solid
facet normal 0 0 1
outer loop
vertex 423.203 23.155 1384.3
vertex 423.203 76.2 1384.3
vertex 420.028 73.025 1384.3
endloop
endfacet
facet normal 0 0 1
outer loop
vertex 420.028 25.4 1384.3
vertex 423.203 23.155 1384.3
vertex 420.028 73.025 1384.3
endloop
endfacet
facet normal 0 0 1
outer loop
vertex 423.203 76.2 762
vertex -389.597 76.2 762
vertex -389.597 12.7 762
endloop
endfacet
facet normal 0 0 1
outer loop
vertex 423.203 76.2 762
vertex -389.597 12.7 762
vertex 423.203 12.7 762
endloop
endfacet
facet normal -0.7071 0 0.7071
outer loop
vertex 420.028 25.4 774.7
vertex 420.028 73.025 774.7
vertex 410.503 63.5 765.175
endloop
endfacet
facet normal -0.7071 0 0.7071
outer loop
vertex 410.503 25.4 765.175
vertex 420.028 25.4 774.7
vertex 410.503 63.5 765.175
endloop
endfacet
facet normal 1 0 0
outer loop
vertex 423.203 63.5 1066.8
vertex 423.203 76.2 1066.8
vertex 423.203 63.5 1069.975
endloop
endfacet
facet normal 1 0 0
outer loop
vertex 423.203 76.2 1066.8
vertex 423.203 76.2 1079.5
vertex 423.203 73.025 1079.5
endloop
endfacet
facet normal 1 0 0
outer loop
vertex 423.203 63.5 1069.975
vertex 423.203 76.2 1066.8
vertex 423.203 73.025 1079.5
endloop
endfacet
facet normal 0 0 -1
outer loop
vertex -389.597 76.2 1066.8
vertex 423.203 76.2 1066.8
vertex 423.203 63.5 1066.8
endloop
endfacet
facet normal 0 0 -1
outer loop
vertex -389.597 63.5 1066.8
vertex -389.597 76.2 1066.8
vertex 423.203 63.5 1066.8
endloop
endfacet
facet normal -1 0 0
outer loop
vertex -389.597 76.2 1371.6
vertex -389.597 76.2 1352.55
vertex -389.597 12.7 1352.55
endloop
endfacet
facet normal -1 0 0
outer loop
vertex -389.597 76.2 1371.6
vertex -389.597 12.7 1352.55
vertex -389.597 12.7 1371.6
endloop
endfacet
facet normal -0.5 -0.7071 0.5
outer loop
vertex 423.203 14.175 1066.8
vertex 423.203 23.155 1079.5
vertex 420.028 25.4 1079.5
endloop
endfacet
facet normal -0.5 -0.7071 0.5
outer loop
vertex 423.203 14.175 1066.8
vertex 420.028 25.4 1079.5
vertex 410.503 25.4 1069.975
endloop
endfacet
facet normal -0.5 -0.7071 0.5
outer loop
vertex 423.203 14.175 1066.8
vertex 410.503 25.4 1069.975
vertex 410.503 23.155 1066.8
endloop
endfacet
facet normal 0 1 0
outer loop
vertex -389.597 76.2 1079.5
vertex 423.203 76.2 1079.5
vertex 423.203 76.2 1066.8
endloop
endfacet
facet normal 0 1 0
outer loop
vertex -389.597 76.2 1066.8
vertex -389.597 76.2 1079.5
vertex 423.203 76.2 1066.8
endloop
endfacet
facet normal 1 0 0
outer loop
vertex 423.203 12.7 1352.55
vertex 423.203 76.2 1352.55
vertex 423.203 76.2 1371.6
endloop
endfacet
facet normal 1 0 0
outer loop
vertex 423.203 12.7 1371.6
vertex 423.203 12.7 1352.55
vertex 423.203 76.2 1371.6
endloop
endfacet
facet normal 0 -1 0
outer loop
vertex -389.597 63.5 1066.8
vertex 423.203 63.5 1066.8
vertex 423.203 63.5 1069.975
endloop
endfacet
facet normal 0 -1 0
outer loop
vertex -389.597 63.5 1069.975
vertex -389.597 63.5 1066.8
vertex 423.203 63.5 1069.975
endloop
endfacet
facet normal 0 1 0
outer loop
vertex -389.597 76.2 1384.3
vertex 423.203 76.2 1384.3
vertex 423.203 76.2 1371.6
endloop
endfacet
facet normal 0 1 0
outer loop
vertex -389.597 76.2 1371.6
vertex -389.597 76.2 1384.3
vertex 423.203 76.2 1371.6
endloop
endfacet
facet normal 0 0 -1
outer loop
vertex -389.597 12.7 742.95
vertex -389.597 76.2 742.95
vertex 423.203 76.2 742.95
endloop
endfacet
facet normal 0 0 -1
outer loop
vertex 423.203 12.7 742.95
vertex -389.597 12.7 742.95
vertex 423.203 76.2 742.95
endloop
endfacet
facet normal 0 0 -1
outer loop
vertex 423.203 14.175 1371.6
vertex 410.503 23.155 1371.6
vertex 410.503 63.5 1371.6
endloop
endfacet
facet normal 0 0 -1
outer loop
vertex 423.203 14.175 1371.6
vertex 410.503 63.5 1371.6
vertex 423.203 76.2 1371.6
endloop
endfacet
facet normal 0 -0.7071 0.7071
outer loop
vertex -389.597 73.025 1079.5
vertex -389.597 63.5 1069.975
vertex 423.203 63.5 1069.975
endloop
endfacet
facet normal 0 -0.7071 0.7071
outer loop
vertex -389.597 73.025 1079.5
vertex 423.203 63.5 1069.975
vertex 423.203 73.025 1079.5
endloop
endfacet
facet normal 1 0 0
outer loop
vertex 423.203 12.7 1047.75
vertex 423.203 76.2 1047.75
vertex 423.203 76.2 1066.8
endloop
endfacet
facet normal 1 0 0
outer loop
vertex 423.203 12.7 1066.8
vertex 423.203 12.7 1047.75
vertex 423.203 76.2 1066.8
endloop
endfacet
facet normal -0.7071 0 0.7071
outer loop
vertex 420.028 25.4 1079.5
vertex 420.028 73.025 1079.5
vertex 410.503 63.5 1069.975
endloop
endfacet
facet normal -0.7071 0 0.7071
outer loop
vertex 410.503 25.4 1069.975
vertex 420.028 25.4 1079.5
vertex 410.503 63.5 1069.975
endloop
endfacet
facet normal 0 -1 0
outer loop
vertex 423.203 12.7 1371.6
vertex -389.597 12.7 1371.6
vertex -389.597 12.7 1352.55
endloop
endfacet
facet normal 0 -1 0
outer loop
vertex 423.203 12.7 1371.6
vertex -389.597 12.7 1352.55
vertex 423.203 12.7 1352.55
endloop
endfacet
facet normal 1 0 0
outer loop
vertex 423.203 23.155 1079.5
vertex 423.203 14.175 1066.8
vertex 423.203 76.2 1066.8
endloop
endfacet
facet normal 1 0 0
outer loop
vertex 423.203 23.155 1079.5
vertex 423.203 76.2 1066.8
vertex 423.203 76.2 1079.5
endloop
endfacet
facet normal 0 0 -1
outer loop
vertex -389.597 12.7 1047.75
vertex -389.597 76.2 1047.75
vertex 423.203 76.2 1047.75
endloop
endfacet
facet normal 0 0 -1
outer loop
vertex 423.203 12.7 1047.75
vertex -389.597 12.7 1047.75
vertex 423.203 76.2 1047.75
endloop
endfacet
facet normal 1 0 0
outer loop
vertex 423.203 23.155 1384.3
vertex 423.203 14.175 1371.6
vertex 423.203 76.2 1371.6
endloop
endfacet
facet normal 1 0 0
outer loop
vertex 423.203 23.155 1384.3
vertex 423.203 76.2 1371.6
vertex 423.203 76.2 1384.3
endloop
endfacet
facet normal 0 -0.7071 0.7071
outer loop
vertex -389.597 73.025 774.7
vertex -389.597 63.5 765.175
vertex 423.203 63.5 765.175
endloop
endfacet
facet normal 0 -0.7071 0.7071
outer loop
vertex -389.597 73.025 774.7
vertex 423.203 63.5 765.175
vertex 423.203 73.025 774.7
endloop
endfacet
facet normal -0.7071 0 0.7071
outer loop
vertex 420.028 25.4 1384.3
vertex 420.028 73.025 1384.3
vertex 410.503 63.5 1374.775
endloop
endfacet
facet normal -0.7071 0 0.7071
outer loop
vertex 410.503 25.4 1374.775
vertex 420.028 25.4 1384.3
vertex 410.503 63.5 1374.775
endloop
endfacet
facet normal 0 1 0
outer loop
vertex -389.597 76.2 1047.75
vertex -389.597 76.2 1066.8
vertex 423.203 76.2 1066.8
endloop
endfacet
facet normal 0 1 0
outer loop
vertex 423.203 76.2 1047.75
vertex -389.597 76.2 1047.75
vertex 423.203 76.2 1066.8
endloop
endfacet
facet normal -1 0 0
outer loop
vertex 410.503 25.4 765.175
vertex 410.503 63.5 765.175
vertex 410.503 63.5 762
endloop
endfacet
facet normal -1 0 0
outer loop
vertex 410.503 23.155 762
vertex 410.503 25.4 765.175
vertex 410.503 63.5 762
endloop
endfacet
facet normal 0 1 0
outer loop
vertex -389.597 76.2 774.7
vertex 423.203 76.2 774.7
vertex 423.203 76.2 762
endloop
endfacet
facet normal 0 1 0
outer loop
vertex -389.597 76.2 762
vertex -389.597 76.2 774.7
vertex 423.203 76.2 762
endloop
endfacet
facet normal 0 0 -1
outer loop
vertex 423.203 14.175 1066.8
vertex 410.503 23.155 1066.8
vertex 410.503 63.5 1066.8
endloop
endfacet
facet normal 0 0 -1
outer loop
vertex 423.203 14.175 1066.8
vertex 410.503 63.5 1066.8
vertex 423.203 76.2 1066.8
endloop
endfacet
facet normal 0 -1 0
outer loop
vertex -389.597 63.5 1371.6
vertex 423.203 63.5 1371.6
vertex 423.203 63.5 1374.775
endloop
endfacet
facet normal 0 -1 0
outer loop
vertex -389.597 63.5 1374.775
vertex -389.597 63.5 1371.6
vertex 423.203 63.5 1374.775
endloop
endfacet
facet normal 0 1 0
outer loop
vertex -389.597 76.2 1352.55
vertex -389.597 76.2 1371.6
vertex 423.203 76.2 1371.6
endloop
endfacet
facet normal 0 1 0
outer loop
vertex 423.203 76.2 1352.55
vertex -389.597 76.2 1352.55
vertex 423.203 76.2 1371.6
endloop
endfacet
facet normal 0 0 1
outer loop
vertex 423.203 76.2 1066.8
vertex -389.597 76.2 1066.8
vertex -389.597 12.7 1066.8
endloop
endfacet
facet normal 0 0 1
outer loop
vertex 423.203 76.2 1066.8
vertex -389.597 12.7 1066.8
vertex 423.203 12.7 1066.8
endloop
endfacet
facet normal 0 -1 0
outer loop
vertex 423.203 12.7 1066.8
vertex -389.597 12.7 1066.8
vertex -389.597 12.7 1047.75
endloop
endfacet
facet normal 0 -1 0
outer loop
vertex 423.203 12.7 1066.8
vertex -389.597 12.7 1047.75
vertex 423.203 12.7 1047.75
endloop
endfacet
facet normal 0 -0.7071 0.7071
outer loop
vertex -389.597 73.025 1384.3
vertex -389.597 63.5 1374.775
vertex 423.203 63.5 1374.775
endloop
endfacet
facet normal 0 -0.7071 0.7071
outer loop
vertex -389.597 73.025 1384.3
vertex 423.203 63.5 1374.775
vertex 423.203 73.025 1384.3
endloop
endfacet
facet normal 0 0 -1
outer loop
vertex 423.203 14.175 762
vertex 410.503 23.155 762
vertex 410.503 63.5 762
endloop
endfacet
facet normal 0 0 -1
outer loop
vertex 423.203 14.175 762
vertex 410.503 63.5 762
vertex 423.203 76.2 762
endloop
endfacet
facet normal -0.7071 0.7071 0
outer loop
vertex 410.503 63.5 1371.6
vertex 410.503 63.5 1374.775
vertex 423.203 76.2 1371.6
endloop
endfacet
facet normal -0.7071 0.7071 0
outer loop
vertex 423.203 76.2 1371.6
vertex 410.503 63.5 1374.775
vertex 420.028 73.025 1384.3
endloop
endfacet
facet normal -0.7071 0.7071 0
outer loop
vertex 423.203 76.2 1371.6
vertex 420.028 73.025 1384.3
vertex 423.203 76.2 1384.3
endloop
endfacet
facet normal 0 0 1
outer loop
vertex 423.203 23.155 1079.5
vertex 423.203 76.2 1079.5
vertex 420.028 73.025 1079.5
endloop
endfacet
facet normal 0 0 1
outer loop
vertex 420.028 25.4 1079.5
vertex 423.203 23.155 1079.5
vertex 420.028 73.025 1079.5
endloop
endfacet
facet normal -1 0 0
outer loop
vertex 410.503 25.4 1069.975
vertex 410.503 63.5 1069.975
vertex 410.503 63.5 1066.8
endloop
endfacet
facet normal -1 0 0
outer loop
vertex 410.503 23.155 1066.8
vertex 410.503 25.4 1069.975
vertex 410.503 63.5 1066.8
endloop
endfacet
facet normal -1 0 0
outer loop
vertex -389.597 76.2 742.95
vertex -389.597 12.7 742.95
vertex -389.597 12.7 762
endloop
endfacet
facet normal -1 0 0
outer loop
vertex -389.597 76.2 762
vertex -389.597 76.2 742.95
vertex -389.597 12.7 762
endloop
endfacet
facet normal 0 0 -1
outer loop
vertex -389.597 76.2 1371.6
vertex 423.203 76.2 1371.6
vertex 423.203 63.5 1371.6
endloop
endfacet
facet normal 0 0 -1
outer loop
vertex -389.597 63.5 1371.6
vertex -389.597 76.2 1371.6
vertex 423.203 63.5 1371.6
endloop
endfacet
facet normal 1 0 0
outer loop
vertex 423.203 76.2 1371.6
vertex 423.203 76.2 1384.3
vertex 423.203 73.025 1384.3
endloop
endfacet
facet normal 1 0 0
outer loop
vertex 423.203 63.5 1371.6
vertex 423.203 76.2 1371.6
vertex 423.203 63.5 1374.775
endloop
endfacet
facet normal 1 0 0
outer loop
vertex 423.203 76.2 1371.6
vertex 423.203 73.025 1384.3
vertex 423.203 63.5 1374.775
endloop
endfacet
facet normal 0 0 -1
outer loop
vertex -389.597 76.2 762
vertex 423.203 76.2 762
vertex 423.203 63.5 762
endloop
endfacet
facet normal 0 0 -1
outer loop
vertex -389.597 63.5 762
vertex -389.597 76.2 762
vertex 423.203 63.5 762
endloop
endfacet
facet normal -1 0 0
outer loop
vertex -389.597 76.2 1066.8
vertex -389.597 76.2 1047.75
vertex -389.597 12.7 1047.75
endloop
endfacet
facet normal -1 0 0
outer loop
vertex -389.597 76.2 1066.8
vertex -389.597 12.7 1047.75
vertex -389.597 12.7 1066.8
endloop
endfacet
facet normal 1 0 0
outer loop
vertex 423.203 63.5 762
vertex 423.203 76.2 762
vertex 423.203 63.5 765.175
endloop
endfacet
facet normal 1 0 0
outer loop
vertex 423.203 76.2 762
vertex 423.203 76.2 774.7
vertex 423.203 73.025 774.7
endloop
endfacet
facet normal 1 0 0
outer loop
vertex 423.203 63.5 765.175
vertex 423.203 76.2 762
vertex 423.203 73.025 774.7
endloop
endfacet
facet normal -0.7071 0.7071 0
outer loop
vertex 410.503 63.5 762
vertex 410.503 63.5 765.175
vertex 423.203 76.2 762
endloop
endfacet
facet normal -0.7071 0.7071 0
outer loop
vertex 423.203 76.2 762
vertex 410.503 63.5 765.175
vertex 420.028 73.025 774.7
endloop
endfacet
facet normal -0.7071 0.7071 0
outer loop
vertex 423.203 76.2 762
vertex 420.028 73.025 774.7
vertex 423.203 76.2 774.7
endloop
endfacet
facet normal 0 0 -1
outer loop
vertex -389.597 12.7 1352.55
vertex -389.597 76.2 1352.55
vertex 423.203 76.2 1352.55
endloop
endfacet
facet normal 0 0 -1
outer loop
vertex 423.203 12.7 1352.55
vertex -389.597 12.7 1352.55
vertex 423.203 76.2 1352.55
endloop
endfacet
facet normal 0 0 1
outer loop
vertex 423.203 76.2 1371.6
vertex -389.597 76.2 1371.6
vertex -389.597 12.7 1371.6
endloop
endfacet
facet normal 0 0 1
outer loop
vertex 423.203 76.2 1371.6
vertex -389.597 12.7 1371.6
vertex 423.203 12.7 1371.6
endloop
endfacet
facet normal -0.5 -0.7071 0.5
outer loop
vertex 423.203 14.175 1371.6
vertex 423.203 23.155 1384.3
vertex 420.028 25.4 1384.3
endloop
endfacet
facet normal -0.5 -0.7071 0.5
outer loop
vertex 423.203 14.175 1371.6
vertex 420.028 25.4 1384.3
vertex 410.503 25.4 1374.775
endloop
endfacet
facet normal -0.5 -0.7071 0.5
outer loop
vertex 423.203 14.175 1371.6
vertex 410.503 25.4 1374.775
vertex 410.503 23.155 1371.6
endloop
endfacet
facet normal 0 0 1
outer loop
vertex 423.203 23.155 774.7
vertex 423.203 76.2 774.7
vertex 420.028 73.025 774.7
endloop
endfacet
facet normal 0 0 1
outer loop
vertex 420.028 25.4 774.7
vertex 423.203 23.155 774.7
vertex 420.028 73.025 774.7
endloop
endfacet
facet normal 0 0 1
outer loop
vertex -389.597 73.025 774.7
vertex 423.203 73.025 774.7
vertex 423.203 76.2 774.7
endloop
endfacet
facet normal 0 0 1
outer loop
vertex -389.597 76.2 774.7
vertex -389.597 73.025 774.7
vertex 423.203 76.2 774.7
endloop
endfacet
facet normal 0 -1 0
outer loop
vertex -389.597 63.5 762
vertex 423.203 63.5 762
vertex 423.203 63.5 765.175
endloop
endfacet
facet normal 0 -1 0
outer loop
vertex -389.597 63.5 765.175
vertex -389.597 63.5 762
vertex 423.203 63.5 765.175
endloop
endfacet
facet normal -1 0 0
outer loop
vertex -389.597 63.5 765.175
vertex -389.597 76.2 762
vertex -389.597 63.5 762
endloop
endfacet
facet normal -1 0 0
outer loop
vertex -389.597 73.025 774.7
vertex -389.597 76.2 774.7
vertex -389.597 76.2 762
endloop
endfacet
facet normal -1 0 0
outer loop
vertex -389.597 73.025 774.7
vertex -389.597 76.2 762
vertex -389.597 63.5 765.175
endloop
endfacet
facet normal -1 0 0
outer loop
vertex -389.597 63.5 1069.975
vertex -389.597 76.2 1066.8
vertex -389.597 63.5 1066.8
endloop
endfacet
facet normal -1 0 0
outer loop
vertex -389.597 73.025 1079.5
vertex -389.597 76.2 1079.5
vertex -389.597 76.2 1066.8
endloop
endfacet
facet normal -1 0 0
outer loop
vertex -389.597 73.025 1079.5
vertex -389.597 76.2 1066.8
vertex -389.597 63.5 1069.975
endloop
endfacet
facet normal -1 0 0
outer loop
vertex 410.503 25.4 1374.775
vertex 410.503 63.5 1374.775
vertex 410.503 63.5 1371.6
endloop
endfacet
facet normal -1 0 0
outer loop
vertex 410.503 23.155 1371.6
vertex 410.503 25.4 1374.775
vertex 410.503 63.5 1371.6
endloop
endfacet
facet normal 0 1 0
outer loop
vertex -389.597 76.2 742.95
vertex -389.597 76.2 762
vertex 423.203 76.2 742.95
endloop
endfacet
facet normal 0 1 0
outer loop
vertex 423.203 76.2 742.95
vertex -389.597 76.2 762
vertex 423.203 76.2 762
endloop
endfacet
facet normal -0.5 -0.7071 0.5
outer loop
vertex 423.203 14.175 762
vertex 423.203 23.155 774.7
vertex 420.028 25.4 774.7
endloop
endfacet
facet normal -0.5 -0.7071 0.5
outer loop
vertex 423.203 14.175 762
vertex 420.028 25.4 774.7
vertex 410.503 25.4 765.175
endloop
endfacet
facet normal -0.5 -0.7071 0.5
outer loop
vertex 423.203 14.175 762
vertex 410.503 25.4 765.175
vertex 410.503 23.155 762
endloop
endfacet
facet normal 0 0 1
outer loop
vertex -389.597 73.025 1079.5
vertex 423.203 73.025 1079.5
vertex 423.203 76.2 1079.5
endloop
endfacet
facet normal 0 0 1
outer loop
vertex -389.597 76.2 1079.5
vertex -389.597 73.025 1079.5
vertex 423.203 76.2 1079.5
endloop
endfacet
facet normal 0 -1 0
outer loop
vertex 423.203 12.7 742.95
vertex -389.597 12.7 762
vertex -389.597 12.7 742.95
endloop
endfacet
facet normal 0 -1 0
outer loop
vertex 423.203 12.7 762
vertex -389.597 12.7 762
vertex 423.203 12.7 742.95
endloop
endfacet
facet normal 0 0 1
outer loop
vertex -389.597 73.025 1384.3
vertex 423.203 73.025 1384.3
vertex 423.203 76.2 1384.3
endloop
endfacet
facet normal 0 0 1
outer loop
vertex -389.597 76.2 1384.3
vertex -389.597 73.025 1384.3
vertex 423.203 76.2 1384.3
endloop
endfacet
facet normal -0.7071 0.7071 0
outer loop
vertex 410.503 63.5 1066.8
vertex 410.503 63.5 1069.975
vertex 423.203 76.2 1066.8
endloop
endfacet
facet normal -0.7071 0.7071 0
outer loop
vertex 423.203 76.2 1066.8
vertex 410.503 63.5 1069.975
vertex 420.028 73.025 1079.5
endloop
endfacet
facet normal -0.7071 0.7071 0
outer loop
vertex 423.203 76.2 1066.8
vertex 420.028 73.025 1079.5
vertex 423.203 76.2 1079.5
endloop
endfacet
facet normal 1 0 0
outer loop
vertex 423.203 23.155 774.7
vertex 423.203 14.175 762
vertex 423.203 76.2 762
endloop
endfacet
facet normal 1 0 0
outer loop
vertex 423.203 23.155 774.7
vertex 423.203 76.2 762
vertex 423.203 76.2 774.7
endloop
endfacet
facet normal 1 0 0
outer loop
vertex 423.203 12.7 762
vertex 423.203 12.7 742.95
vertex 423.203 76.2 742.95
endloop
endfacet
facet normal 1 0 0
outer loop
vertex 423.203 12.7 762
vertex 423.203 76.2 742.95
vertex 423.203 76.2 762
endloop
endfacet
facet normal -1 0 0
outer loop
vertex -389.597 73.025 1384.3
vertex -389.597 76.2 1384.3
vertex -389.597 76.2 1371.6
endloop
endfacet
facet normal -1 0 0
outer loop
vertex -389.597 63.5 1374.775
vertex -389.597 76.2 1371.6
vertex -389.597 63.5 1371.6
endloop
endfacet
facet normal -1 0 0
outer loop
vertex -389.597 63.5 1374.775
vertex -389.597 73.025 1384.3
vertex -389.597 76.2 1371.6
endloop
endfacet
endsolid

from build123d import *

# Parameters (mm, degrees)
F2_W          = 812.8
F2_H          = 19.05
F3_DEPTH      = 63.5
F5_DEPTH      = 63.5
F6_T1_DEPTH   = 78.7911320759
F6_2_T1_DEPTH = 78.7911320759
F6_3_T1_DEPTH = 78.7911320759
F8_DEPTH      = 25.4
F8_DEPTH_BACK = 762
F10_DEPTH     = 812.8


# Not quite as in the source:
# - a fillet or chamfer that OpenCascade refuses, or shapes differently, is made with other operations: its cross-section is extruded or revolved along the edge and cut away or added


with BuildPart() as f3:
    # F2 (on face) → F3 (new body)
    with BuildSketch(Plane.XZ.offset(-76.2)):
        with Locations((16.8031001225, 1362.075)):
            Rectangle(F2_W, F2_H)
    extrude(amount=F3_DEPTH)


with BuildPart() as f3b:
    # F2 (on face) → F3, piece 2 (new body)
    with BuildSketch(Plane.XZ.offset(-76.2)):
        with Locations((16.8031001225, 1057.275)):
            Rectangle(F2_W, F2_H)
    extrude(amount=F3_DEPTH)


with BuildPart() as f3c:
    # F2 (on face) → F3, piece 3 (new body)
    with BuildSketch(Plane.XZ.offset(-76.2)):
        with Locations((16.8031001225, 752.475)):
            Rectangle(F2_W, F2_H)
    extrude(amount=F3_DEPTH)


with BuildPart() as f5:
    # F4 (on face) → F5 (new body)
    with BuildSketch(Plane.XZ.offset(-76.2)):
        Polygon((410.5031001225, 1371.6), (423.2031001225, 1371.6), (423.2031001225, 1384.3), (420.0281001225, 1384.3), (410.5031001225, 1374.775), align=None)
    extrude(amount=F5_DEPTH)

    # F6: chamfer of 12.7 on 1 edges, made by hand

    # F6_s2 → F6_t1 (cut)
    with BuildSketch(Plane(origin=(925.2584219554, 0, 925.2584219554), x_dir=(0, 1, 0), z_dir=(-0.7071067812, 0, -0.7071067812))):
        Polygon((25.4, -681.843199311), (12.7, -669.143199311), (12.7, -681.843199311), align=None)
    extrude(amount=F6_T1_DEPTH, mode=Mode.SUBTRACT)


with BuildPart() as f5b:
    # F4 (on face) → F5, piece 2 (new body)
    with BuildSketch(Plane.XZ.offset(-76.2)):
        Polygon((410.5031001225, 1066.8), (423.2031001225, 1066.8), (423.2031001225, 1079.5), (420.0281001225, 1079.5), (410.5031001225, 1069.975), align=None)
    extrude(amount=F5_DEPTH)

    # F6#2: chamfer of 12.7 on 1 edges, made by hand

    # F6_2_s2 → F6_2_t1 (cut)
    with BuildSketch(Plane(origin=(772.8584219554, 0, 772.8584219554), x_dir=(0, 1, 0), z_dir=(-0.7071067812, 0, -0.7071067812))):
        Polygon((25.4, -466.3170524054), (12.7, -453.6170524054), (12.7, -466.3170524054), align=None)
    extrude(amount=F6_2_T1_DEPTH, mode=Mode.SUBTRACT)


with BuildPart() as f5c:
    # F4 (on face) → F5, piece 3 (new body)
    with BuildSketch(Plane.XZ.offset(-76.2)):
        Polygon((410.5031001225, 762), (423.2031001225, 762), (423.2031001225, 774.7), (420.0281001225, 774.7), (410.5031001225, 765.175), align=None)
    extrude(amount=F5_DEPTH)

    # F6#3: chamfer of 12.7 on 1 edges, made by hand

    # F6_3_s2 → F6_3_t1 (cut)
    with BuildSketch(Plane(origin=(620.4584219554, 0, 620.4584219554), x_dir=(0, 1, 0), z_dir=(-0.7071067812, 0, -0.7071067812))):
        Polygon((25.4, -250.7909054997), (12.7, -238.0909054997), (12.7, -250.7909054997), align=None)
    extrude(amount=F6_3_T1_DEPTH, mode=Mode.SUBTRACT)


with BuildPart() as f8_tool:
    # F7 (on face) → F8 (new body, two sides)
    with BuildSketch(Plane.XY.offset(1371.6)) as f8_sk:
        Polygon((405.7026830367, 58.6995829142), (423.2031001225, 76.2), (423.2031001225, 80.5244233704), (405.7026830367, 80.5244233704), align=None)
    extrude(amount=F8_DEPTH)
    extrude(f8_sk.sketch, amount=-F8_DEPTH_BACK)


with BuildPart() as f5_1:
    add(f5.part)

    # F8: cut by f8_tool
    add(f8_tool.part, mode=Mode.SUBTRACT)


with BuildPart() as f5b_1:
    add(f5b.part)

    # F8: cut by f8_tool
    add(f8_tool.part, mode=Mode.SUBTRACT)


with BuildPart() as f5c_1:
    add(f5c.part)

    # F8: cut by f8_tool
    add(f8_tool.part, mode=Mode.SUBTRACT)


with BuildPart() as f10:
    # F9 (on face) → F10 (new body)
    with BuildSketch(Plane(origin=(423.2031001225, 0, 0), x_dir=(0, -1, 0), z_dir=(-1, 0, 0))):
        Polygon((-76.2, 1384.3), (-76.2, 1371.6), (-63.5, 1371.6), (-63.5, 1374.775), (-73.025, 1384.3), align=None)
    extrude(amount=F10_DEPTH)


with BuildPart() as f10b:
    # F9 (on face) → F10, piece 2 (new body)
    with BuildSketch(Plane(origin=(423.2031001225, 0, 0), x_dir=(0, -1, 0), z_dir=(-1, 0, 0))):
        Polygon((-76.2, 1079.5), (-76.2, 1066.8), (-63.5, 1066.8), (-63.5, 1069.975), (-73.025, 1079.5), align=None)
    extrude(amount=F10_DEPTH)


with BuildPart() as f10c:
    # F9 (on face) → F10, piece 3 (new body)
    with BuildSketch(Plane(origin=(423.2031001225, 0, 0), x_dir=(0, -1, 0), z_dir=(-1, 0, 0))):
        Polygon((-76.2, 774.7), (-76.2, 762), (-63.5, 762), (-63.5, 765.175), (-73.025, 774.7), align=None)
    extrude(amount=F10_DEPTH)


solid = Compound([f3.part, f3b.part, f3c.part, f5_1.part, f5b_1.part, f5c_1.part, f10.part, f10b.part, f10c.part])
